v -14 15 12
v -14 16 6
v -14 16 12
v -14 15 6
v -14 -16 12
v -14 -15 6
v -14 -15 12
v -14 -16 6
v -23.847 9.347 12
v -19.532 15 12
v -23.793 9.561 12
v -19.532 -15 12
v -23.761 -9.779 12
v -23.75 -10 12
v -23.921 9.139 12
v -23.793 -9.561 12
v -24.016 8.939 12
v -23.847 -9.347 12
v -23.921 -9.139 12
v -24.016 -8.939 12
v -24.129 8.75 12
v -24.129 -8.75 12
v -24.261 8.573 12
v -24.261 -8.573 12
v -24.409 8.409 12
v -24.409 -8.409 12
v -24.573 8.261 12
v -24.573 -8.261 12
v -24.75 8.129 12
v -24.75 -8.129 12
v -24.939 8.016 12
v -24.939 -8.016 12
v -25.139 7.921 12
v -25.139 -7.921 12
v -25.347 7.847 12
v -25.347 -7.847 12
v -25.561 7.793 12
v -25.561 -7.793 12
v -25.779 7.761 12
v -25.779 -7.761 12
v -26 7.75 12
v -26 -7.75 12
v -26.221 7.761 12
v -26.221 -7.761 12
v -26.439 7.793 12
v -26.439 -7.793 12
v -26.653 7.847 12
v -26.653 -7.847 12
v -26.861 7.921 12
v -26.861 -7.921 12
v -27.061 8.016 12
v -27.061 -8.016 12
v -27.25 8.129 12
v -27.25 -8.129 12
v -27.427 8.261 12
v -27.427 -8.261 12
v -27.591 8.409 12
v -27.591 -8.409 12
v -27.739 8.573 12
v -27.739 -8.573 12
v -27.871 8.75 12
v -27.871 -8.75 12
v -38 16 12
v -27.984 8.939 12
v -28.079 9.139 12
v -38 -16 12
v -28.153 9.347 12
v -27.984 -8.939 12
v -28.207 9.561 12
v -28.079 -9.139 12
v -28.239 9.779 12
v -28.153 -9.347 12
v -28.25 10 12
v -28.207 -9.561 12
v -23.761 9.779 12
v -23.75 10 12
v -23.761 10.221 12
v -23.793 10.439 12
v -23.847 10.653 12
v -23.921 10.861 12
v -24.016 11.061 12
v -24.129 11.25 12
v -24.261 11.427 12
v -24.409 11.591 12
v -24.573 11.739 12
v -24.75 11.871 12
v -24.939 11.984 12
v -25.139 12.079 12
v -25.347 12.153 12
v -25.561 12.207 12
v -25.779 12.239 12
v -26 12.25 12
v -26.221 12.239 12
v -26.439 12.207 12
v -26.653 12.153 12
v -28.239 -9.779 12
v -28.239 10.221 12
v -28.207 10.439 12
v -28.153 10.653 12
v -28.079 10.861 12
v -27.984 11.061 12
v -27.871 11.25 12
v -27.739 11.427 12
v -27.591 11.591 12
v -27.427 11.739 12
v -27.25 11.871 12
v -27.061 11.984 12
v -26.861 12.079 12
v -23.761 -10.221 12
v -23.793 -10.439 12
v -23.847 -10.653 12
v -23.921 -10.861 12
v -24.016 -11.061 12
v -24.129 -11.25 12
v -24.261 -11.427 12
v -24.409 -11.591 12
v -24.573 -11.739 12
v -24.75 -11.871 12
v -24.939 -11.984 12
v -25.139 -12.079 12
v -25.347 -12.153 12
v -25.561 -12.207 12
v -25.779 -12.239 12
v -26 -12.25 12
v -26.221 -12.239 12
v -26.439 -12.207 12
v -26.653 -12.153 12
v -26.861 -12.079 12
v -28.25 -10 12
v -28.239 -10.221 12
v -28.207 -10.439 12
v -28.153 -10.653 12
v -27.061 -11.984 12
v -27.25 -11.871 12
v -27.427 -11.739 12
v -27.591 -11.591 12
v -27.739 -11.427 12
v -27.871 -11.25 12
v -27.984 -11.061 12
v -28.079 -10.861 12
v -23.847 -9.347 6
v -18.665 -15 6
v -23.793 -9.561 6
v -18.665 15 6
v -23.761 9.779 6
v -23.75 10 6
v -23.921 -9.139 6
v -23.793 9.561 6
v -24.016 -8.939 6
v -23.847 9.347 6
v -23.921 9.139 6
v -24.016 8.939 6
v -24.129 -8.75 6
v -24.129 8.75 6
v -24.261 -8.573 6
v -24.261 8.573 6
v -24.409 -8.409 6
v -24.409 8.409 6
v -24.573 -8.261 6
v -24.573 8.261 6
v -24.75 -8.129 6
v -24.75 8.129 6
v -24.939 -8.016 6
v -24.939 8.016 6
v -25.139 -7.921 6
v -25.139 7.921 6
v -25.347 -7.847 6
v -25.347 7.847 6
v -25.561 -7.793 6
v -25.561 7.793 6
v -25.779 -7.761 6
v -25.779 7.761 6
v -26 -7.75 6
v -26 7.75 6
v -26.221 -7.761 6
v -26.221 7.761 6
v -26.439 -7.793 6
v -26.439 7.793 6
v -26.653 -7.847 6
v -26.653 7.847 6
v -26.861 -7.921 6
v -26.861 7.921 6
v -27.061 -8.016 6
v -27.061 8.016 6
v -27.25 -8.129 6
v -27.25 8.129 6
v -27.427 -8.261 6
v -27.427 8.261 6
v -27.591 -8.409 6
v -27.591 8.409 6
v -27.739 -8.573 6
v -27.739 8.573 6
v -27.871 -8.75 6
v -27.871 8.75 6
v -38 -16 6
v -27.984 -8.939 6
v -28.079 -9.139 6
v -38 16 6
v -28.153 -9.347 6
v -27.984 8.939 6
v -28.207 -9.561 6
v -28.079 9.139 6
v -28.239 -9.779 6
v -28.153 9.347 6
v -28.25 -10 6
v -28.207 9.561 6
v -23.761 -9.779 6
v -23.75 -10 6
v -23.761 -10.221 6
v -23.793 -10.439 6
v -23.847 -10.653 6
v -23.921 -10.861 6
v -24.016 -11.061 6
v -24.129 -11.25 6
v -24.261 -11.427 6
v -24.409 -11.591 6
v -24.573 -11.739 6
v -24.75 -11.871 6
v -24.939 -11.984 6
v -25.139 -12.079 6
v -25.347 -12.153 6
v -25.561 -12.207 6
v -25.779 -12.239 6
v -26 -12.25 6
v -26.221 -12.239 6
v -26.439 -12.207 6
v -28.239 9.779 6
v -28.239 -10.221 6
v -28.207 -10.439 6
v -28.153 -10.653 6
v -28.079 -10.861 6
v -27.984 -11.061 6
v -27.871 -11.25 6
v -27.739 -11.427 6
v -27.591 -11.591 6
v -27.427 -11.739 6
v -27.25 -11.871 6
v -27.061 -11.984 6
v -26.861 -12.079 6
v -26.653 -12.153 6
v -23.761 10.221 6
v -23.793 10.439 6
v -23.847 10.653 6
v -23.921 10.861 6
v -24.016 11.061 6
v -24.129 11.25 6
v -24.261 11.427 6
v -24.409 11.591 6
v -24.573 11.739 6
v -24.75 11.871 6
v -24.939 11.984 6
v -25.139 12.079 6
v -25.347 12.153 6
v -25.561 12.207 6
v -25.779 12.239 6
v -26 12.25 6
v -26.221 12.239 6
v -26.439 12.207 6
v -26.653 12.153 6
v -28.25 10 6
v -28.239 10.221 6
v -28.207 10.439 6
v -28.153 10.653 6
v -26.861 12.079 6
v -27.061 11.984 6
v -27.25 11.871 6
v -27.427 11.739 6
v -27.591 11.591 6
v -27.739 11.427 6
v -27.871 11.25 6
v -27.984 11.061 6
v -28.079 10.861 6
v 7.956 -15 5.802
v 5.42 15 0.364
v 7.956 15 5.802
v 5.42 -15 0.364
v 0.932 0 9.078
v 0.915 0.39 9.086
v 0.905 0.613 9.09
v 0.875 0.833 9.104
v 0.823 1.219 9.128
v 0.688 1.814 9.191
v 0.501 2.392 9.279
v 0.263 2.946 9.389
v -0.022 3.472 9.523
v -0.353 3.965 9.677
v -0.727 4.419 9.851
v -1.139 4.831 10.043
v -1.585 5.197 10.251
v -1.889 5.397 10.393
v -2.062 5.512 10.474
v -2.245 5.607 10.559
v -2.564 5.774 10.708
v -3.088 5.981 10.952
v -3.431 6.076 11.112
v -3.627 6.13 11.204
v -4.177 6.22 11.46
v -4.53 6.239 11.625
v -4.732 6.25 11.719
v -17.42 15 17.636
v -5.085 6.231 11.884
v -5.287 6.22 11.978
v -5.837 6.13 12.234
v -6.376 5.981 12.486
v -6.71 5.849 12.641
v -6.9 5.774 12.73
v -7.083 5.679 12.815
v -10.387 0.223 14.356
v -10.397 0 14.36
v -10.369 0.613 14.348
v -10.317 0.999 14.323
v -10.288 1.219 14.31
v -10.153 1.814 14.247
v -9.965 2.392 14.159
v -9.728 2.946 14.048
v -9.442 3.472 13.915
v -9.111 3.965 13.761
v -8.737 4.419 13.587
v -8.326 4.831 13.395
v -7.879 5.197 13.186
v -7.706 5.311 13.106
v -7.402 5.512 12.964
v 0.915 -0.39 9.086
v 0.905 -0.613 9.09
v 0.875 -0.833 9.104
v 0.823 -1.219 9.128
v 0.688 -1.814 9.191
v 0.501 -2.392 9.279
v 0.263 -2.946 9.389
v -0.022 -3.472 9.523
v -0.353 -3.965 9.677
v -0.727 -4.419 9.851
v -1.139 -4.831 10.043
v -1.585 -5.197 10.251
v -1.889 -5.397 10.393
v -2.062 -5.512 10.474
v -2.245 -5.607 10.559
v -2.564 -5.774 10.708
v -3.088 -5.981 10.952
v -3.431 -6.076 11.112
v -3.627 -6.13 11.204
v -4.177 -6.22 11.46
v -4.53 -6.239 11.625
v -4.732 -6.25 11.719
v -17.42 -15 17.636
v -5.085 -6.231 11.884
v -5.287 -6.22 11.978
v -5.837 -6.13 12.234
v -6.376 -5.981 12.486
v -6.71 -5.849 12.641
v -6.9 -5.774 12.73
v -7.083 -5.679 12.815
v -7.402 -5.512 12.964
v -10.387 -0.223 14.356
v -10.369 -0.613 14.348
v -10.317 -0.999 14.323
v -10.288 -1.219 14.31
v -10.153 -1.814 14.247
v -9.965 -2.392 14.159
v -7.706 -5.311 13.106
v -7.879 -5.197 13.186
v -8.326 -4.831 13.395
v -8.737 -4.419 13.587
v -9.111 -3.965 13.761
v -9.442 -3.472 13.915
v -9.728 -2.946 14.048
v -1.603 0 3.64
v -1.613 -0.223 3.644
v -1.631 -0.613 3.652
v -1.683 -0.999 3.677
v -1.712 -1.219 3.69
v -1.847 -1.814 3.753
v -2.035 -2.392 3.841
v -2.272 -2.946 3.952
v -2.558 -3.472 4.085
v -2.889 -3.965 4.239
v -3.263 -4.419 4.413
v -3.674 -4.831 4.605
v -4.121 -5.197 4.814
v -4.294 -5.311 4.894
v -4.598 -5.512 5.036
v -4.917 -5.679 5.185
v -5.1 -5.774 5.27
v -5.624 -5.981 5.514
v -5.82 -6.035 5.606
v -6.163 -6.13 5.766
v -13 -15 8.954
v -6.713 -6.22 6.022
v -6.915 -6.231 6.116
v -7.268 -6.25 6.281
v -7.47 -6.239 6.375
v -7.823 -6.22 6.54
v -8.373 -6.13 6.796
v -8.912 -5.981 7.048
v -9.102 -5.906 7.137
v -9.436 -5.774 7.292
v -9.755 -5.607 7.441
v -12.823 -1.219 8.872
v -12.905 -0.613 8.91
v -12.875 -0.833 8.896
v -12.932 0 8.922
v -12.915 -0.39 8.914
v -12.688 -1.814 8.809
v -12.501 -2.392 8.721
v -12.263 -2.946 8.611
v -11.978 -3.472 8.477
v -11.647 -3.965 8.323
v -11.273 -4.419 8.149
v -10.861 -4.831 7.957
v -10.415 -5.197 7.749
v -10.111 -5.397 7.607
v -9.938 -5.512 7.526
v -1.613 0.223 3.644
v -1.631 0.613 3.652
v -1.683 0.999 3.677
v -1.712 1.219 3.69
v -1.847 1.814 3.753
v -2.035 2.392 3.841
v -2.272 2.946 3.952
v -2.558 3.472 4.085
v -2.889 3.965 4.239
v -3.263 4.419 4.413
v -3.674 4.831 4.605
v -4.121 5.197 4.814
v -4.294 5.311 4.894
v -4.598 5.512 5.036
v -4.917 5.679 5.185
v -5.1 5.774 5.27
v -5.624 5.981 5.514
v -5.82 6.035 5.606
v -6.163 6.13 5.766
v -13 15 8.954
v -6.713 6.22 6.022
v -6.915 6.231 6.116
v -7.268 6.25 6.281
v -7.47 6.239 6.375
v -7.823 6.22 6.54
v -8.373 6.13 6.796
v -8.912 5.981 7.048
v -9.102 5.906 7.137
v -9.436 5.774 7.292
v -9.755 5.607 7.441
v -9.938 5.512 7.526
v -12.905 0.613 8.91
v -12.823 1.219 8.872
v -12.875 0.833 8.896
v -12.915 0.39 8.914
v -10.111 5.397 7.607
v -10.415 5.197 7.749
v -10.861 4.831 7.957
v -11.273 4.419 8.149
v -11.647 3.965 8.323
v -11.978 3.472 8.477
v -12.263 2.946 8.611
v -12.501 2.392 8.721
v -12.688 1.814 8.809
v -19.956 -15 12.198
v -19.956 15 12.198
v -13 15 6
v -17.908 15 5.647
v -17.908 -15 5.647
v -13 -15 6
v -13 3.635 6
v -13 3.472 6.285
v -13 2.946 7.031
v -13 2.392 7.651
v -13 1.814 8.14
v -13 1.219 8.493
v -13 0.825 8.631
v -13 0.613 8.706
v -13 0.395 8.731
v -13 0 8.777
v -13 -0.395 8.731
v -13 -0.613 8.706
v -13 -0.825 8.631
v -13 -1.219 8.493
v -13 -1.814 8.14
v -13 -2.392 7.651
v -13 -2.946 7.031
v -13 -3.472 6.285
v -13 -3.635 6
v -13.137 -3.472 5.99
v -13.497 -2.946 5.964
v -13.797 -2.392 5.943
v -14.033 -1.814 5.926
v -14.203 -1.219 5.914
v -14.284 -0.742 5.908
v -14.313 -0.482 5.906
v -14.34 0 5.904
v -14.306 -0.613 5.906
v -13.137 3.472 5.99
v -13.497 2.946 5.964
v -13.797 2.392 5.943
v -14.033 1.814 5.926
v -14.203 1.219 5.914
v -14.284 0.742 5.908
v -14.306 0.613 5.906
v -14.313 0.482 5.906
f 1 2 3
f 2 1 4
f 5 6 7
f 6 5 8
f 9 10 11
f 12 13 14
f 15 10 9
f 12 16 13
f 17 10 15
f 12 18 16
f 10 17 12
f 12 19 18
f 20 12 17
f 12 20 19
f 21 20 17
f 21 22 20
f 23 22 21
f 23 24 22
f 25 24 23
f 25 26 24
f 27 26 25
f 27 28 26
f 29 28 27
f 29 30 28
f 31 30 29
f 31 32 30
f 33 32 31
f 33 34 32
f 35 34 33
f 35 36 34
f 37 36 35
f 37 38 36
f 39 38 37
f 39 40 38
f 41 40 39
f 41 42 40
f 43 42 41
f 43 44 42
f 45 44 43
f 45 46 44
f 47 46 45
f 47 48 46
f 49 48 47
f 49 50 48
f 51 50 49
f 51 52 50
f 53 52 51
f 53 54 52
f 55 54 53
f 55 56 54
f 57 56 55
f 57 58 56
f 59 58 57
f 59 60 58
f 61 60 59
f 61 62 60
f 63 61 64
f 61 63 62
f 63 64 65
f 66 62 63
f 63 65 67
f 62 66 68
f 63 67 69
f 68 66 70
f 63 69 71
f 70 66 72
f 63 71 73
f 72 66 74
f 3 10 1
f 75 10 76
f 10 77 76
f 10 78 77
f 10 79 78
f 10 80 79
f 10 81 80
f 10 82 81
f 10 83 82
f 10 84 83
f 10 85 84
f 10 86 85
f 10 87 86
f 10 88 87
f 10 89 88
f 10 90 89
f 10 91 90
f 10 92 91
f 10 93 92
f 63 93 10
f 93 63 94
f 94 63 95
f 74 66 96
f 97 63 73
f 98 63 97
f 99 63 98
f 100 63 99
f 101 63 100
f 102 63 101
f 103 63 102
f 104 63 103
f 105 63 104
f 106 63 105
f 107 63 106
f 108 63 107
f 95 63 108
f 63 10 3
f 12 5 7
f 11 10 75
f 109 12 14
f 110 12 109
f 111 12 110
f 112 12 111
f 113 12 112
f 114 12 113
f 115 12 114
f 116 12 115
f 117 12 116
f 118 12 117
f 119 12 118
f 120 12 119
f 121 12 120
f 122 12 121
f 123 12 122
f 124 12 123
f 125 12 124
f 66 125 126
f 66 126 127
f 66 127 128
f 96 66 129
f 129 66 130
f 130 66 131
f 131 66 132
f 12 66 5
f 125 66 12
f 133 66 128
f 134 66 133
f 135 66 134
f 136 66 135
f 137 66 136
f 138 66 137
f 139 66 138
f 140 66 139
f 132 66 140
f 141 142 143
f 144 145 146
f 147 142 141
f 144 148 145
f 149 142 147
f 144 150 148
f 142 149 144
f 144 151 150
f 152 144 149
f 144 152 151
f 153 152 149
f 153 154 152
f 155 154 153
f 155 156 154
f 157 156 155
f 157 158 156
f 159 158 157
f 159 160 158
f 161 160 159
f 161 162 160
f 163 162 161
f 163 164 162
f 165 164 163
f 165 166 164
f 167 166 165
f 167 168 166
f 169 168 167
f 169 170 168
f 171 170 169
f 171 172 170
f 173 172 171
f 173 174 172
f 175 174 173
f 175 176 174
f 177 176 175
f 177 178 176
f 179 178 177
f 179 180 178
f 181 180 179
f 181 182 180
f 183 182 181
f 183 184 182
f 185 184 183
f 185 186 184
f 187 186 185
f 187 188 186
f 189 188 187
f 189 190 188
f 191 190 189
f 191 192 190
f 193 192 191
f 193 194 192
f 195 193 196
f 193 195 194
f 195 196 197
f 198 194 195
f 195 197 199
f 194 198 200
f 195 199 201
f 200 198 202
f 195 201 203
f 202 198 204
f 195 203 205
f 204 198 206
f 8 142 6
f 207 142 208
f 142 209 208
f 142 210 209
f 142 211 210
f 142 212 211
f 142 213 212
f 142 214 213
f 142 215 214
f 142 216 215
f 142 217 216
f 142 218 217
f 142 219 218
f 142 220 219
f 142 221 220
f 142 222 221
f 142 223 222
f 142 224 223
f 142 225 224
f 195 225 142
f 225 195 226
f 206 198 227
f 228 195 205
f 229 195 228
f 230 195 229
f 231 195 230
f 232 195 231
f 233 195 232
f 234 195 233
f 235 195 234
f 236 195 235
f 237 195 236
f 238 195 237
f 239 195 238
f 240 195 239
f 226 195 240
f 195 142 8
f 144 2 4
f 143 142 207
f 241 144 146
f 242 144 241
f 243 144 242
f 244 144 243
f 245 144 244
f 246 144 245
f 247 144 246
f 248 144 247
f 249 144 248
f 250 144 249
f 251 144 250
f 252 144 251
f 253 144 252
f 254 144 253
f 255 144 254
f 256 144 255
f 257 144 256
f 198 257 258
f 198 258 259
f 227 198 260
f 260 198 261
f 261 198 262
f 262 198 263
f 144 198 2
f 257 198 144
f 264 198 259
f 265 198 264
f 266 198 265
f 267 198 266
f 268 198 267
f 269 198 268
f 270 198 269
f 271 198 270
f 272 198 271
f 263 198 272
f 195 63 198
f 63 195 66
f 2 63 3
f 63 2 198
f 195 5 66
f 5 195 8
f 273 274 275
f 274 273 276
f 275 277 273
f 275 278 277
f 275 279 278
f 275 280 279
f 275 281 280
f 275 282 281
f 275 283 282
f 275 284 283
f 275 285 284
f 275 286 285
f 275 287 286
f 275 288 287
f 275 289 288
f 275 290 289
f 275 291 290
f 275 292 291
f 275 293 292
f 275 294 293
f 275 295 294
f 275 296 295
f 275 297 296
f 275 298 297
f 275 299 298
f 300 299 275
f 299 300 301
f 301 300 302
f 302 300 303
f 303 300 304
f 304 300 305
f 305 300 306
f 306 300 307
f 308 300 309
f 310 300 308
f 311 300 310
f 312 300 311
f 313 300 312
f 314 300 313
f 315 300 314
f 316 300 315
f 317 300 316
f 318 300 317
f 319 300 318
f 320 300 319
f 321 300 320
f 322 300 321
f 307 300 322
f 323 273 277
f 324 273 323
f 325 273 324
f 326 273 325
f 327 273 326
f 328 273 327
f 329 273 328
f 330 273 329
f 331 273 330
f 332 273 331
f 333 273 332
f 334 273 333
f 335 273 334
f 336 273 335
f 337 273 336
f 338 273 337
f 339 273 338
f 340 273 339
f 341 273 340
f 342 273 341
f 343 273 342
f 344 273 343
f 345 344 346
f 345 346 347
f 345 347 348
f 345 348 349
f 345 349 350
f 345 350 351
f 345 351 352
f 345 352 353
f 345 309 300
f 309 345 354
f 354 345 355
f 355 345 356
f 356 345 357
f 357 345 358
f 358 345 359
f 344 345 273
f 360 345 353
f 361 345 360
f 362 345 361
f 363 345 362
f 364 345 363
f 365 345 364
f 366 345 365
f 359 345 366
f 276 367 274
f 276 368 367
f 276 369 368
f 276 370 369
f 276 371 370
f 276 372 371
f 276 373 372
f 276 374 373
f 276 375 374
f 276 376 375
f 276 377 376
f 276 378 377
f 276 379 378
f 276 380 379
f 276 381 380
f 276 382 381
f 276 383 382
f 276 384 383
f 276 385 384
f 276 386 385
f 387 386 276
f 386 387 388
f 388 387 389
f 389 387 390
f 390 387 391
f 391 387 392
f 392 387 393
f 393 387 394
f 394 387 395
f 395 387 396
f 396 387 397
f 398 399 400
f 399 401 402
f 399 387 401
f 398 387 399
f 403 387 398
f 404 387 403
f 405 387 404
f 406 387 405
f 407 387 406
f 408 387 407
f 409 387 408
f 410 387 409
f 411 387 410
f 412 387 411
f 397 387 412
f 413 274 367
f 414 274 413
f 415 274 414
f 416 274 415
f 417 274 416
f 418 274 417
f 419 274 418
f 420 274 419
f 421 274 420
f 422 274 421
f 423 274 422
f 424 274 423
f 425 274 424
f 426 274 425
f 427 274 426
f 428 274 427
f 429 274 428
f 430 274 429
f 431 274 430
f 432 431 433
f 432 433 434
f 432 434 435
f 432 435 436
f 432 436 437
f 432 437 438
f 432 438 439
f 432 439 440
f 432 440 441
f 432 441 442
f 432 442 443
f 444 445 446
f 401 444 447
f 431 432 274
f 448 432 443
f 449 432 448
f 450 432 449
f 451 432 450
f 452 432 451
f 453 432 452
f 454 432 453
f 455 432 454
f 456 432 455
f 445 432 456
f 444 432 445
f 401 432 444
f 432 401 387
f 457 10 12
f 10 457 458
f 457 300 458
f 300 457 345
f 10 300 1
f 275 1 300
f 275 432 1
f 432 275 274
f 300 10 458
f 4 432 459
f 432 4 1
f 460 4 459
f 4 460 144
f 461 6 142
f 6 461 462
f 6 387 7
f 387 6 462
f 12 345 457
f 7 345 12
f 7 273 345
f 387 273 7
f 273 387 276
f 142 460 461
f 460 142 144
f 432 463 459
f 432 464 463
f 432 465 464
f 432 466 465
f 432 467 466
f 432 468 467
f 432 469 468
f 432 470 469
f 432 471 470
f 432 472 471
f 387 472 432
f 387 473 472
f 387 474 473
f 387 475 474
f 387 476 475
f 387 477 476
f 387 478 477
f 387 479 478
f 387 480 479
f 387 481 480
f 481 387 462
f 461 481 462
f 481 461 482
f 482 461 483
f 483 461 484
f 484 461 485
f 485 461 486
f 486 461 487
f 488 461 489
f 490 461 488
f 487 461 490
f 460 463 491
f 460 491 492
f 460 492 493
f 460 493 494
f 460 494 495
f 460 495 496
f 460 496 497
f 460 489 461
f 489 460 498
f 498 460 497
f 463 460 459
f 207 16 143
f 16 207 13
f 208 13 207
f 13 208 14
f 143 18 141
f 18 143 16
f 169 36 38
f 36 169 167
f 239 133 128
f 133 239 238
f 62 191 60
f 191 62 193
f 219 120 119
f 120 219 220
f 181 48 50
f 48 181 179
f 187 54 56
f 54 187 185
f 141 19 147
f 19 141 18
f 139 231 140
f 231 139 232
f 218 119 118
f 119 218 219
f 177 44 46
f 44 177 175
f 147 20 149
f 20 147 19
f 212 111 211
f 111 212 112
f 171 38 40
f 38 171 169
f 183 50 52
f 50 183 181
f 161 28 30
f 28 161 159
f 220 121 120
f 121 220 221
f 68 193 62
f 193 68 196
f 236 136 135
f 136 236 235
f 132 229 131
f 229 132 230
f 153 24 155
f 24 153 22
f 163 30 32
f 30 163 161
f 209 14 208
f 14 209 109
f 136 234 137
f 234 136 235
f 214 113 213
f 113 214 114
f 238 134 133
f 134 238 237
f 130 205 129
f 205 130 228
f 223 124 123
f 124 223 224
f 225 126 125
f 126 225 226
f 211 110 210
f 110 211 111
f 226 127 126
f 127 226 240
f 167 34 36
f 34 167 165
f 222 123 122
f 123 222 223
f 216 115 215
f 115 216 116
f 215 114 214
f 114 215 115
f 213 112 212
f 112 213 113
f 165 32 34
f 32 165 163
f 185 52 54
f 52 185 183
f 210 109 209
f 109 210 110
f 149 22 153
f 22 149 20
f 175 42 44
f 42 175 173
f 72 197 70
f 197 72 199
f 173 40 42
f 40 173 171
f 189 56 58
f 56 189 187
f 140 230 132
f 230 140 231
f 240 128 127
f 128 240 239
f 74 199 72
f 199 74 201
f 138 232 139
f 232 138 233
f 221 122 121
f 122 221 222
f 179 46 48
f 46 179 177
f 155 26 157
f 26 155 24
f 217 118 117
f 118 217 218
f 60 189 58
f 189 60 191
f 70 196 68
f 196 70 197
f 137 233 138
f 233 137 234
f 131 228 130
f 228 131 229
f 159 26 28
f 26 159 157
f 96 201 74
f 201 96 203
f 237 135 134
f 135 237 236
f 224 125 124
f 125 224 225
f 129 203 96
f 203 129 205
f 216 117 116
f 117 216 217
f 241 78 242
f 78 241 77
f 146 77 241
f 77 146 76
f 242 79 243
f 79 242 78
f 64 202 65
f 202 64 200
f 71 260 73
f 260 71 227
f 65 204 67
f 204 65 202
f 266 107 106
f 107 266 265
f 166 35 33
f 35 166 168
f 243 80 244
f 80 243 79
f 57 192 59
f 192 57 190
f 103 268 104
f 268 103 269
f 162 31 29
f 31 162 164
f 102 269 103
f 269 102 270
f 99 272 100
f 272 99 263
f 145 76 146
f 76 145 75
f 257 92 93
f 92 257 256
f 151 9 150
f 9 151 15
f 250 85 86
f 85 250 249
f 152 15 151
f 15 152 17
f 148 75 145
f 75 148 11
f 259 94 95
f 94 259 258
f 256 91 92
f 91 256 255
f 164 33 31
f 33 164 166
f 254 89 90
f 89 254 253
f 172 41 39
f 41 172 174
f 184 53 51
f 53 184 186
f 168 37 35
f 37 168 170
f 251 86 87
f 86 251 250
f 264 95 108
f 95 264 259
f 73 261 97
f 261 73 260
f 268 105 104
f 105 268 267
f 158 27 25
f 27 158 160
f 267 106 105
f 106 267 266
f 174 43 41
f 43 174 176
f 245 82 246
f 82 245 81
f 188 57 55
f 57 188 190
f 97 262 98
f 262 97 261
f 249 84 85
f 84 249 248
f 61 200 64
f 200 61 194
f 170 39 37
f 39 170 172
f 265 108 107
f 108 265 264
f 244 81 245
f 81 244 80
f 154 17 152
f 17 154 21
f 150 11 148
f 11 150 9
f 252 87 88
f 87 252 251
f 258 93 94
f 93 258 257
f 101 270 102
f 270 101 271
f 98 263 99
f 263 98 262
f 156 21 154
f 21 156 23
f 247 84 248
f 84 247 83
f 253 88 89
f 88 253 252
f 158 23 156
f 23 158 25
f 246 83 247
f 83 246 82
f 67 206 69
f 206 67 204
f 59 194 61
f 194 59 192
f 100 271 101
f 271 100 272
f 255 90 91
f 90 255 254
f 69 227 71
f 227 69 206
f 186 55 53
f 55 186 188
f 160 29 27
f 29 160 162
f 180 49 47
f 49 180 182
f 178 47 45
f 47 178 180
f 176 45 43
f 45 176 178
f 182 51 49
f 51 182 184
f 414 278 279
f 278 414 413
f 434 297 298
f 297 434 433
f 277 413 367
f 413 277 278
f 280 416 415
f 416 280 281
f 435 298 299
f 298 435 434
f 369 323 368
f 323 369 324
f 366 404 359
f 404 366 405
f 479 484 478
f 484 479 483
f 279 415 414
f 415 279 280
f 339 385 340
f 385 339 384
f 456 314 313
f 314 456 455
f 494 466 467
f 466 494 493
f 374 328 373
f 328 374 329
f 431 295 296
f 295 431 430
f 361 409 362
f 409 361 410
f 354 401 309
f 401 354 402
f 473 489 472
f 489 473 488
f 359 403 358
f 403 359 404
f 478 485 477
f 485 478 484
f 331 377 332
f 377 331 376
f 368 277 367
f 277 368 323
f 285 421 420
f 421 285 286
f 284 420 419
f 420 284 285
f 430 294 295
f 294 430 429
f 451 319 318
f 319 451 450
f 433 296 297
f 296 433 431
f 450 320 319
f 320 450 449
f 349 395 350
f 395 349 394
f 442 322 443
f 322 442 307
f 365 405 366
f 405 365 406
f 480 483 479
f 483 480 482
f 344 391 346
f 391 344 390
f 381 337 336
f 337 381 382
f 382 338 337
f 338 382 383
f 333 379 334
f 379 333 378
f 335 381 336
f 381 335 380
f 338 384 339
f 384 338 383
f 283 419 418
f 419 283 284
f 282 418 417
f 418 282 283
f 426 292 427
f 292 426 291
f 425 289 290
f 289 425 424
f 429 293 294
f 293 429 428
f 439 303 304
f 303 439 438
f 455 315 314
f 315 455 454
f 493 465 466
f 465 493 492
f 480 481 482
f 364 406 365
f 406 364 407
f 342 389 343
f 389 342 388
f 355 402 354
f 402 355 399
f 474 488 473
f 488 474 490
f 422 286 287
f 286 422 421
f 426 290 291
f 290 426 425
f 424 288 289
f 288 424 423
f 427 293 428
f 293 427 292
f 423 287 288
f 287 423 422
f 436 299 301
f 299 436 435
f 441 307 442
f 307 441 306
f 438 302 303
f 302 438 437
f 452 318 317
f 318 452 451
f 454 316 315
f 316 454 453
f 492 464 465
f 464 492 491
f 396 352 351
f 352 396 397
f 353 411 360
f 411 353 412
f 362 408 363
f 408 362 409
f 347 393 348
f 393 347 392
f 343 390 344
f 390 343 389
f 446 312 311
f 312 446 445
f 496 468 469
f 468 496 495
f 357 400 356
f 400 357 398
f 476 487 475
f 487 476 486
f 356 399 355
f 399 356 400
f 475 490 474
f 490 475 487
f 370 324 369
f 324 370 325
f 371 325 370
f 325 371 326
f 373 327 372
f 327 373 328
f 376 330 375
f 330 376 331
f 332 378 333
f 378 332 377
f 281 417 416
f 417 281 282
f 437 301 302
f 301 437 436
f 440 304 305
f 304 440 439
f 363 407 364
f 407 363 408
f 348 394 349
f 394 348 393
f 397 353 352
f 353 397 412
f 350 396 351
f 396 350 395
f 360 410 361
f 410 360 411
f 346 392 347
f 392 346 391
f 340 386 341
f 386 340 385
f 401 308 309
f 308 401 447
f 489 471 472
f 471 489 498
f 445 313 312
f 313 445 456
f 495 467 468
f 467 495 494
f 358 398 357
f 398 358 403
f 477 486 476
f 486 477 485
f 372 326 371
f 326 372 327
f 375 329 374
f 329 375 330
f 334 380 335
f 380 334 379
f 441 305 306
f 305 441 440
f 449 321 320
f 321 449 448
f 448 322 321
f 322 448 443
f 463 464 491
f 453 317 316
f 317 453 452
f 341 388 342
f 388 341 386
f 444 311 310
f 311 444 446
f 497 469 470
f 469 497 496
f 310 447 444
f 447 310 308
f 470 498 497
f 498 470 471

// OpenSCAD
// Rim-jet test fixture dimensions in millimetres.
// This removable saddle mounts a straight bulkhead outlet at 25° inward
// from vertical. A separate reservoir and equal-length tubes supply the jets.
clearance_diameter = 12.5;
tilt = 25;
$fn = 64;

difference() {
    union() {
        translate([-38,-16,6]) cube([24,32,6]);
        translate([-6,0,9]) rotate([0,tilt,0]) cube([28,30,6],center=true);
        hull() {
            translate([-16,-15,6]) cube([3,30,6]);
            translate([-18,0,9]) rotate([0,tilt,0]) cube([3,30,6],center=true);
        }
    }
    translate([-6,0,9]) rotate([0,tilt,0])
        cylinder(d=clearance_diameter,h=22,center=true);
    for (y = [-10,10])
        translate([-26,y,-1]) cylinder(d=4.5,h=20);
}
